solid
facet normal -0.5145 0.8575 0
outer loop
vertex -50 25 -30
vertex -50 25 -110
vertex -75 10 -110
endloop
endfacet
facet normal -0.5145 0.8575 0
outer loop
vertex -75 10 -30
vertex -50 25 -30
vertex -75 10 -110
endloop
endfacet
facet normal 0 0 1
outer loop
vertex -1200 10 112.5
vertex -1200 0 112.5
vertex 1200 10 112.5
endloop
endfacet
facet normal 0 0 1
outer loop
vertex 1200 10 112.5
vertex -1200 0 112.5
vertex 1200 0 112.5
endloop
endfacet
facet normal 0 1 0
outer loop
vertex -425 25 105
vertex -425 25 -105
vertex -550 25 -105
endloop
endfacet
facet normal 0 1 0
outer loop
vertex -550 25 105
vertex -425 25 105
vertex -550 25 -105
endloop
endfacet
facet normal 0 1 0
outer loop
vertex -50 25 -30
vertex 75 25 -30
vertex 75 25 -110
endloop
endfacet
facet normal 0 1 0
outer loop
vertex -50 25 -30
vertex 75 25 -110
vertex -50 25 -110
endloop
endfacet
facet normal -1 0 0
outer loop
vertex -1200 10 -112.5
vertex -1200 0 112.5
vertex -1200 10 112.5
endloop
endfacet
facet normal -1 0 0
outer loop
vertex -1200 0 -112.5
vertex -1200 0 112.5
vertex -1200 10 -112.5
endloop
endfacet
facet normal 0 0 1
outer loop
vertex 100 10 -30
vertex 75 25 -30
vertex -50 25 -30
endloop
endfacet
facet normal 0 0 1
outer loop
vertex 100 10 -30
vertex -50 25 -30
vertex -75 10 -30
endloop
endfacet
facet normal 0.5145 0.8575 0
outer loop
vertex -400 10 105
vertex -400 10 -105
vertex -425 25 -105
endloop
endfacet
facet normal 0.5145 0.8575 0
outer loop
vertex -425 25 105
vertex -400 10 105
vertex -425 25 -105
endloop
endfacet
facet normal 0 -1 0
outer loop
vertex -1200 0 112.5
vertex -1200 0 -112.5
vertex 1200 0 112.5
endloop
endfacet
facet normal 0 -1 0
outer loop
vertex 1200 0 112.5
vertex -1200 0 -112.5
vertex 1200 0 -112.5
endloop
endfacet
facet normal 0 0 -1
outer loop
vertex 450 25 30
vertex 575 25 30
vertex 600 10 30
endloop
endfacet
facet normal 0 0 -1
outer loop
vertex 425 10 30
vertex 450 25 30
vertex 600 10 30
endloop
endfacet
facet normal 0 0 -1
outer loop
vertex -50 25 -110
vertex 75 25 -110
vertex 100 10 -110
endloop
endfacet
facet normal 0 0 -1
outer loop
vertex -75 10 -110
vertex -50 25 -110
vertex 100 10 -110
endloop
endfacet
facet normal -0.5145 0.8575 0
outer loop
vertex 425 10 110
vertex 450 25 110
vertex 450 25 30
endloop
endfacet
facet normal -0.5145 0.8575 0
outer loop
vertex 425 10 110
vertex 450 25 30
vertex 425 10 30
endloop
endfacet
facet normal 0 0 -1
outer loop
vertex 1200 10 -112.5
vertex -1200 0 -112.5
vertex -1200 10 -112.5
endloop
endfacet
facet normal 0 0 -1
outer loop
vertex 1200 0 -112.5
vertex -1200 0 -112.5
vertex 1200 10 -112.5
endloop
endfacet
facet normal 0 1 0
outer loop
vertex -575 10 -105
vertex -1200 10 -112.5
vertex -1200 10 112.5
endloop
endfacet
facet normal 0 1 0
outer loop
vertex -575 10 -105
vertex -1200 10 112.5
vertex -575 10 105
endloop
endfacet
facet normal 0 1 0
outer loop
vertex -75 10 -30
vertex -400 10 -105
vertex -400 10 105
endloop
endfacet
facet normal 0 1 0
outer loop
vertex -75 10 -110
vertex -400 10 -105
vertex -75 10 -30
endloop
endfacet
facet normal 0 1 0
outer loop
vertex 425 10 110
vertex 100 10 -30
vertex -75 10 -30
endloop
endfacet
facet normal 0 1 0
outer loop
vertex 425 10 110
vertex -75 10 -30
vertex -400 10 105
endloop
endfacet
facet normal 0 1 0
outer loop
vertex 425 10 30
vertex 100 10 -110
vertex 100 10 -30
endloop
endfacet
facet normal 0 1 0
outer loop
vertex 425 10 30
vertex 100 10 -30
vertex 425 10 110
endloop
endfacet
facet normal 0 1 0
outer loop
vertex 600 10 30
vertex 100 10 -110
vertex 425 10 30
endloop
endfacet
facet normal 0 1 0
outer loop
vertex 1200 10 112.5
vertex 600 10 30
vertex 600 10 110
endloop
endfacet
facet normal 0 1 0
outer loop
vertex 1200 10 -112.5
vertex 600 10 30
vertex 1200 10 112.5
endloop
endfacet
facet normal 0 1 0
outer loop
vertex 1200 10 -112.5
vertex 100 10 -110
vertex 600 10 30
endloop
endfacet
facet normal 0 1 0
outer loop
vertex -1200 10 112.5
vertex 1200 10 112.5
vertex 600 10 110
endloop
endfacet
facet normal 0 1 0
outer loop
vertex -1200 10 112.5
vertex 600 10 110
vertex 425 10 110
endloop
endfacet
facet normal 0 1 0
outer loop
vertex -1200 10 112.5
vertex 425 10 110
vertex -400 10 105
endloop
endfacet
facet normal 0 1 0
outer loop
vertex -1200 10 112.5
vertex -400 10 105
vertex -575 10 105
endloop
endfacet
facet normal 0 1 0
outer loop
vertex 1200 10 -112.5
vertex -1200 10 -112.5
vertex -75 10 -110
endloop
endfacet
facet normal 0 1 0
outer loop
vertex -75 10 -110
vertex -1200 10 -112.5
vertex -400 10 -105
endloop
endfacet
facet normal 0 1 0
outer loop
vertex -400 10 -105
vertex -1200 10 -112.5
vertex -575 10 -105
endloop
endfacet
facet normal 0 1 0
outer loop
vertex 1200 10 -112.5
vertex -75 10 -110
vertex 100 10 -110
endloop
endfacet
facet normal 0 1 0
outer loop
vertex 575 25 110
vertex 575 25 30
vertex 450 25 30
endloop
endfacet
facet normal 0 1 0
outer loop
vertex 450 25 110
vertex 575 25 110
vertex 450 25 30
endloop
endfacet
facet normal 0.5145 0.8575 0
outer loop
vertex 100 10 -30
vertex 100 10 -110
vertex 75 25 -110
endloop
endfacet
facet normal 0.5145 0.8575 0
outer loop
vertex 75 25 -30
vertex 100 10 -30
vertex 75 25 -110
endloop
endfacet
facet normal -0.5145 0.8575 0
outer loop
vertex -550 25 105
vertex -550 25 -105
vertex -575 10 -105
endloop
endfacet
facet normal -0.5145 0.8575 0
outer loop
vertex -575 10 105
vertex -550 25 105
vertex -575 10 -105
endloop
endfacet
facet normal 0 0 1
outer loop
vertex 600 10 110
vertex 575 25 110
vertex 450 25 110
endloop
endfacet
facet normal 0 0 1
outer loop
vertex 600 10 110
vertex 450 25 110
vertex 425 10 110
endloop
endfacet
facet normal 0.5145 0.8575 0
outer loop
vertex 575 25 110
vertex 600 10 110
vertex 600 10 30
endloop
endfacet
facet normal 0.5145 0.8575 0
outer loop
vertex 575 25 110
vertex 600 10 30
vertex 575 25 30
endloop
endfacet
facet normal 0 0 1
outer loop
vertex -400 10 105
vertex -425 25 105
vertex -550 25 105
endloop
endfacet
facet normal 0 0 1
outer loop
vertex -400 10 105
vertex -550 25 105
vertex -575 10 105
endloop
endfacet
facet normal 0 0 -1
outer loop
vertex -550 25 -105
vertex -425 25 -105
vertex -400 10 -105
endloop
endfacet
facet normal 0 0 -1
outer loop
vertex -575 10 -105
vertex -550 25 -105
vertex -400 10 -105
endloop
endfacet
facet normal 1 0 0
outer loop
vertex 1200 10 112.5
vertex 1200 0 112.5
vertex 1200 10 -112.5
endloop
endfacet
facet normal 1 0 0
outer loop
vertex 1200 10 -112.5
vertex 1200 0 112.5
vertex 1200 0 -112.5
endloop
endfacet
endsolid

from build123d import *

# Parameters (mm, degrees)
SKETCH1_W                = 2400
SKETCH1_H                = 225
BOSS_EXTRUDE1_DEPTH      = 10
BOSS_EXTRUDE2_START      = 30
BOSS_EXTRUDE2_DEPTH      = 80
BOSS_EXTRUDE3_START      = -30
BOSS_EXTRUDE3_DEPTH      = 80
BOSS_EXTRUDE4_DEPTH      = 105
BOSS_EXTRUDE4_DEPTH_BACK = 105


with BuildPart() as part:
    # Sketch1 → Boss-Extrude1 (new body)
    with BuildSketch(Plane(origin=(0, 0, 0), x_dir=(1, 0, 0), z_dir=(0, 1, 0))):
        Rectangle(SKETCH1_W, SKETCH1_H)
    extrude(amount=BOSS_EXTRUDE1_DEPTH)

    # Sketch2 → Boss-Extrude2 (add)
    with BuildSketch(Plane.XY.offset(BOSS_EXTRUDE2_START)):
        Polygon((425, 10), (600, 10), (575, 25), (450, 25), align=None)
    extrude(amount=BOSS_EXTRUDE2_DEPTH)

    # Sketch4 → Boss-Extrude3 (add)
    with BuildSketch(Plane.XY.offset(BOSS_EXTRUDE3_START)):
        Polygon((100, 10), (75, 25), (-50, 25), (-75, 10), align=None)
    extrude(amount=-BOSS_EXTRUDE3_DEPTH)

    # Sketch5 → Boss-Extrude4 (add, two sides: drawn at the far end of the back side and taken through both)
    with BuildSketch(Plane.XY.offset(-BOSS_EXTRUDE4_DEPTH_BACK)):
        Polygon((-575, 10), (-400, 10), (-425, 25), (-550, 25), align=None)
    extrude(amount=BOSS_EXTRUDE4_DEPTH + BOSS_EXTRUDE4_DEPTH_BACK)


solid = part.part
